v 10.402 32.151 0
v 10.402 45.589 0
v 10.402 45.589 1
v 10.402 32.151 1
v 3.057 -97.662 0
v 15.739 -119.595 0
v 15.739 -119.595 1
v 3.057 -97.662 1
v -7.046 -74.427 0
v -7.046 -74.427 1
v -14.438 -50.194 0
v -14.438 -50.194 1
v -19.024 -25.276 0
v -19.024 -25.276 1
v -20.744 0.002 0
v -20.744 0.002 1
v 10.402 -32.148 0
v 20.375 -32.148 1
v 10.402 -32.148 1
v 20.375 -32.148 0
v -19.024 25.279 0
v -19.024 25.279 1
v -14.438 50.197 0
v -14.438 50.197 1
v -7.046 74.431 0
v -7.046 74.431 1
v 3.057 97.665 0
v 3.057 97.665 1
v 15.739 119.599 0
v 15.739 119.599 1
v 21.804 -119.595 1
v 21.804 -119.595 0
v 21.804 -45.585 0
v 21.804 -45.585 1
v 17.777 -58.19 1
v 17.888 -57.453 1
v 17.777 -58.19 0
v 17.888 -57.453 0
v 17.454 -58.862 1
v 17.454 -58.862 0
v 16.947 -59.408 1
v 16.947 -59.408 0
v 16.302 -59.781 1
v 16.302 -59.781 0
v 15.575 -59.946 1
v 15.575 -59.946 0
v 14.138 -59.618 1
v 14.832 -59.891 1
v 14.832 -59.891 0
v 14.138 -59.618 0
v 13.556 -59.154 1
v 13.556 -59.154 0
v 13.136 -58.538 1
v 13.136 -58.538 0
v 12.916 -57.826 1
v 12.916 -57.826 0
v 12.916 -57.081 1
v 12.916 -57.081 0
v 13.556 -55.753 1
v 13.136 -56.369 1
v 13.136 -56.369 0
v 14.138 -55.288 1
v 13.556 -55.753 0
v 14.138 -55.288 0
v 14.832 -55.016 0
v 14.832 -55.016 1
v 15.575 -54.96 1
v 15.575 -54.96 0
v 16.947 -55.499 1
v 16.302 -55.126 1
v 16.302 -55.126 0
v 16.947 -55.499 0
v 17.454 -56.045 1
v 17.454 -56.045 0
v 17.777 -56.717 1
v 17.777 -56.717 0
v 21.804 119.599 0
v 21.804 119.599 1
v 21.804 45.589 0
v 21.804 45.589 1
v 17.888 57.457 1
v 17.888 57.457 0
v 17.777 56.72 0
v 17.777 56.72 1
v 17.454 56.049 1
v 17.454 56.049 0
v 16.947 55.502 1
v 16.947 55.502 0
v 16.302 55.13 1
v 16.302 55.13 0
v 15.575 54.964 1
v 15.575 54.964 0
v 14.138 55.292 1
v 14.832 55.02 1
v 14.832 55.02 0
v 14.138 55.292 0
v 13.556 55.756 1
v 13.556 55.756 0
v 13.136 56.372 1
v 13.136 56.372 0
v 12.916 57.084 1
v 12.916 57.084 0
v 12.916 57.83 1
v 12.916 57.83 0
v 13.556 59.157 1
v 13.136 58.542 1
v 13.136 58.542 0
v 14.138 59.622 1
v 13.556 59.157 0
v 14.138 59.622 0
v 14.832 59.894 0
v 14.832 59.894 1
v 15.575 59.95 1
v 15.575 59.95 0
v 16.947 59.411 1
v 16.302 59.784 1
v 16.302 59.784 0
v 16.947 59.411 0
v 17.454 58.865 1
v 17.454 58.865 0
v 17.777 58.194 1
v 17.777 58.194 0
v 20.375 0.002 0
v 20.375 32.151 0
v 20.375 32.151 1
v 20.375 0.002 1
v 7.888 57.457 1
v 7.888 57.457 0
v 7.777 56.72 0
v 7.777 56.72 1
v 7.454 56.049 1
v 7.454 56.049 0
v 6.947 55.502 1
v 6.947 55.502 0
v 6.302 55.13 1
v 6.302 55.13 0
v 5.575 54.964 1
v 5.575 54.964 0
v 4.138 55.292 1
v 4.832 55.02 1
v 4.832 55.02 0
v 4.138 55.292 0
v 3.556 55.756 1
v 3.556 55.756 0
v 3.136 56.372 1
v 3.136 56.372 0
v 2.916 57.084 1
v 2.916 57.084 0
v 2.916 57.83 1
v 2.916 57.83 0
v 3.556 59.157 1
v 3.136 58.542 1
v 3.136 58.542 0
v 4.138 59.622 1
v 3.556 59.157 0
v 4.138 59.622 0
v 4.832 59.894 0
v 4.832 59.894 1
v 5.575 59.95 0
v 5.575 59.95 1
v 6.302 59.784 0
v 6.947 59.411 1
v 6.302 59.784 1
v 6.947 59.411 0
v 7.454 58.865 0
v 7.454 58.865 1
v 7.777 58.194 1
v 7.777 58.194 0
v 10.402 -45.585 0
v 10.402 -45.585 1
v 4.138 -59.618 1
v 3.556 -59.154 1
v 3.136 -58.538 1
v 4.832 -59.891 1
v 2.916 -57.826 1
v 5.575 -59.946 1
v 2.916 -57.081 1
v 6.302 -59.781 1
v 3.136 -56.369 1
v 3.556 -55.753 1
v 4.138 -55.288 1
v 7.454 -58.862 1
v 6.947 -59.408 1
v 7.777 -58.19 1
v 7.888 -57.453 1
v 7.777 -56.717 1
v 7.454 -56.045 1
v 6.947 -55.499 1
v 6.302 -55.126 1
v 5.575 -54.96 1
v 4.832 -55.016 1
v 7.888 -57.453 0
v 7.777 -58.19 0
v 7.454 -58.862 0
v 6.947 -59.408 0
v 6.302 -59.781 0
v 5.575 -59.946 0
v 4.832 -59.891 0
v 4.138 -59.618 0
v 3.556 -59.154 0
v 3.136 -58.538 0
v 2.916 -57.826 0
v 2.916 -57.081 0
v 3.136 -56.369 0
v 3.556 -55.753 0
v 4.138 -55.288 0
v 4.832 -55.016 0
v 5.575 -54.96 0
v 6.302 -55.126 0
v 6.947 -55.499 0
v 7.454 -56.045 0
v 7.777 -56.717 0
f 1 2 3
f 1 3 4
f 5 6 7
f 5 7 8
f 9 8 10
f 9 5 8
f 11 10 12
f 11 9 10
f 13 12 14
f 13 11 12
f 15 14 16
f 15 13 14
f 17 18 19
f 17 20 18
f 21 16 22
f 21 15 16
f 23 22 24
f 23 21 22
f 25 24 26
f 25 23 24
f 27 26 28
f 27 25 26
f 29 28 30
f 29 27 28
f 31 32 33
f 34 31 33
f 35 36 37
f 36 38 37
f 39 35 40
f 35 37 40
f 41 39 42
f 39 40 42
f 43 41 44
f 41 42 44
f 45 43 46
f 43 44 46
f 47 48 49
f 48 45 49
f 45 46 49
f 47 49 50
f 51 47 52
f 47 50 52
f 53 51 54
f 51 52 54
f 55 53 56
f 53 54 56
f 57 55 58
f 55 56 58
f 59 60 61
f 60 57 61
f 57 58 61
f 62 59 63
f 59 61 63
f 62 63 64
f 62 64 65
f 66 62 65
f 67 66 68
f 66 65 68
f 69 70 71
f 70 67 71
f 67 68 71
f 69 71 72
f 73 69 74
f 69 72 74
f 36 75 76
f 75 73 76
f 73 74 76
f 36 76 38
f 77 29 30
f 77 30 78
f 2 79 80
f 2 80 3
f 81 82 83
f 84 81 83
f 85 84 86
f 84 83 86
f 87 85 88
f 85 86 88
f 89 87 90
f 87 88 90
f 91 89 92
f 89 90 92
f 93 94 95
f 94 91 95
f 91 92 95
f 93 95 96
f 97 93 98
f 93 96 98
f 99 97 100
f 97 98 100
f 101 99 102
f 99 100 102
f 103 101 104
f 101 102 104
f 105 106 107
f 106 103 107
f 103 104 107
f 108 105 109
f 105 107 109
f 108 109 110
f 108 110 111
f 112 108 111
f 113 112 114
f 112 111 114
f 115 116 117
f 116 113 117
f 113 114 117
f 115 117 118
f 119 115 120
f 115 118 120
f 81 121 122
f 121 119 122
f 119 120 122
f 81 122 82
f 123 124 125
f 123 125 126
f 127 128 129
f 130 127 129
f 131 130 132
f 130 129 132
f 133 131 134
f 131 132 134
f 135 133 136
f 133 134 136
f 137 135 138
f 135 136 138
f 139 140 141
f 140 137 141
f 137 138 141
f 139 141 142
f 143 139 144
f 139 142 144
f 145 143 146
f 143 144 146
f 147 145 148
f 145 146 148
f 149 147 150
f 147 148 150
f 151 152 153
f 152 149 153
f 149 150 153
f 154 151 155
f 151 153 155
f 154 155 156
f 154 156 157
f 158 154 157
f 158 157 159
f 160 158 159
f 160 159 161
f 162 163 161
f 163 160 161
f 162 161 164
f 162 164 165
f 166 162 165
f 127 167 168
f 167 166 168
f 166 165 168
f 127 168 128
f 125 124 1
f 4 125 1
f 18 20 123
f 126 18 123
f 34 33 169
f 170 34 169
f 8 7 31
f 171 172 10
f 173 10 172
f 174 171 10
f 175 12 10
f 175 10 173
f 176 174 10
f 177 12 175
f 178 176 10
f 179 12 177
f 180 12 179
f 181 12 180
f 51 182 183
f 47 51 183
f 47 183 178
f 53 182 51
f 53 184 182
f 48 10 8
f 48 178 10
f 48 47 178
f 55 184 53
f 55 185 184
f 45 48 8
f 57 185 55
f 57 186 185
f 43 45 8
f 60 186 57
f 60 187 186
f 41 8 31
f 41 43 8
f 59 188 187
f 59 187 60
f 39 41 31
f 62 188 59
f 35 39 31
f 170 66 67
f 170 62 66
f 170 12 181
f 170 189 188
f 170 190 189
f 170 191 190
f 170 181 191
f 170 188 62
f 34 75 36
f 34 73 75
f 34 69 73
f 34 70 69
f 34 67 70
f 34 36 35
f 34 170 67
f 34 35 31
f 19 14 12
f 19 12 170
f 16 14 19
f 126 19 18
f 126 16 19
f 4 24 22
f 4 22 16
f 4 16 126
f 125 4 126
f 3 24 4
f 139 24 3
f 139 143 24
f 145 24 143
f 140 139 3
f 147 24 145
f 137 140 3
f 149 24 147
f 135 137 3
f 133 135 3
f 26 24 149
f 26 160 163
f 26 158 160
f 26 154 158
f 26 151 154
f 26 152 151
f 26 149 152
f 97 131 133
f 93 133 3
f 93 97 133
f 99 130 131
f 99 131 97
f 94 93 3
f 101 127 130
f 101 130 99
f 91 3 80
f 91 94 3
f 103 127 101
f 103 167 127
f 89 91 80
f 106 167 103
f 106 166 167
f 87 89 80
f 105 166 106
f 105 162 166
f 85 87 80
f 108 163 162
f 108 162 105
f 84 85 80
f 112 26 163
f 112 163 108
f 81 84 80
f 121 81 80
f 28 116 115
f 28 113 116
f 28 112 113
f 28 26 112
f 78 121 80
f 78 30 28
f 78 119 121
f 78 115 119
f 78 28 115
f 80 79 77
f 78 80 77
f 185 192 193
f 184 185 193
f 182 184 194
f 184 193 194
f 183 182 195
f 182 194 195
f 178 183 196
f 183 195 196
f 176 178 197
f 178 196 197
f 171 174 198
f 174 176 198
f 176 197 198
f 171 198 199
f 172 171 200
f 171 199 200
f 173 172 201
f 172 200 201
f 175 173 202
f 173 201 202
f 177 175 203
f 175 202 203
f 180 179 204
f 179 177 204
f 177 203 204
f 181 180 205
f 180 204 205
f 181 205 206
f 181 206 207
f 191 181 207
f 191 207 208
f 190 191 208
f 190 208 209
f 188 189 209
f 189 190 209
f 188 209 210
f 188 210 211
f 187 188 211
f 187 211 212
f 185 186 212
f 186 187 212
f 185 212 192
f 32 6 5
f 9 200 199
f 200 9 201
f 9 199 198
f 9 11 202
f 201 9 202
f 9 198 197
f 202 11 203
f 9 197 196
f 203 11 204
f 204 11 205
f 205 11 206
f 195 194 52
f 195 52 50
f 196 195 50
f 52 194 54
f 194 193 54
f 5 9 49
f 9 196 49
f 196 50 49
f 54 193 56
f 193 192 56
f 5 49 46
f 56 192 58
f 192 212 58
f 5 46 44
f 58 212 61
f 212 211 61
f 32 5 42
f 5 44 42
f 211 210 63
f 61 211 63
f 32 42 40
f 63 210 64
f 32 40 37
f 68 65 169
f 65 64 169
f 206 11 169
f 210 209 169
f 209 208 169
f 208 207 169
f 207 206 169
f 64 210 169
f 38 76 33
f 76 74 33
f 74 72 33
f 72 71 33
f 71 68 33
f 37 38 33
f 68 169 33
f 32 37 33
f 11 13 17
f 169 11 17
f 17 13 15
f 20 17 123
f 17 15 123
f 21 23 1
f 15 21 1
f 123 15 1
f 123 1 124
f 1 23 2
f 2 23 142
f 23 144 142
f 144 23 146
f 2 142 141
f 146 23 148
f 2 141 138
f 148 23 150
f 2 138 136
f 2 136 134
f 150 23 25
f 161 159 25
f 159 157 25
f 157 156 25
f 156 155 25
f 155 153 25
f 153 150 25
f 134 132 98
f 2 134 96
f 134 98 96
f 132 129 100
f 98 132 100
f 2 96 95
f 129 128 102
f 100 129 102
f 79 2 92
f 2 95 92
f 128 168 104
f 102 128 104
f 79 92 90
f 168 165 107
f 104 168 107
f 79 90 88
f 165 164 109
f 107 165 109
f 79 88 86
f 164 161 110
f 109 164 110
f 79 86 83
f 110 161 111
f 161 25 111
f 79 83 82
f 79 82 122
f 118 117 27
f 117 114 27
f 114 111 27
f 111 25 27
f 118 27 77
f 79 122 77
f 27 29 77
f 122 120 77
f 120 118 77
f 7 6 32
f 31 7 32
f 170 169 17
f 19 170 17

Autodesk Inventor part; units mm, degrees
ref_plane "YZ Plane" through (0, 0, 0) normal (1, 0, 0) x (0, 1, 0)
ref_plane "XZ Plane" through (0, 0, 0) normal (0, 1, 0) x (-1, 0, 0)
ref_plane "XY Plane" through (0, 0, 0) normal (0, 0, 1) x (1, 0, 0)
sketch "Esboço1" plane through (0, 0, 0) normal (0, 0, 1) x (1, 0, 0)
  line L0 (15.7389, -119.5954) -> (21.8039, -119.5954)
  line L1 (21.8039, -119.5954) -> (21.8039, -45.5852)
  line L2 (10.4016, -45.5852) -> (10.4016, -32.1476)
  line L3 (20.3752, -32.1476) -> (20.3752, 0.0017)
  arc A0 (-20.7435, 0.0017) -> (15.7389, -119.5954) centre (201.4548, 2.419) ccw
  circle A1 centre (15.3884, -57.4534) radius 2.5
  line L4 (21.8039, -45.5852) -> (10.4016, -45.5852)
  line L5 (20.3752, -32.1476) -> (10.4016, -32.1476)
  line L6 (20.3752, 0.0017) -> (13.075, 0.0017)
  arc A2 (15.7389, 119.5989) -> (-20.7435, 0.0017) centre (201.4548, -2.4155) ccw
  line L7 (20.3752, 32.1511) -> (20.3752, 0.0017)
  circle A3 centre (15.3884, 57.4569) radius 2.5
  line L8 (10.4016, 45.5887) -> (10.4016, 32.1511)
  line L9 (15.7389, 119.5989) -> (21.8039, 119.5989)
  line L10 (21.8039, 45.5887) -> (10.4016, 45.5887)
  line L11 (20.3752, 32.1511) -> (10.4016, 32.1511)
  line L12 (21.8039, 45.5887) -> (21.8039, 119.5989)
  circle A4 centre (5.3884, -57.4534) radius 2.5
  circle A5 centre (5.3884, 57.4569) radius 2.5
  point P0 (0, 0)
  dimension "d0" = 5
  dimension "d6" = 10
  dimension "d13" = 10
extrude "Extrusão1" add sketch "Esboço1" along normal blind 1
properties part number "sensor2"
